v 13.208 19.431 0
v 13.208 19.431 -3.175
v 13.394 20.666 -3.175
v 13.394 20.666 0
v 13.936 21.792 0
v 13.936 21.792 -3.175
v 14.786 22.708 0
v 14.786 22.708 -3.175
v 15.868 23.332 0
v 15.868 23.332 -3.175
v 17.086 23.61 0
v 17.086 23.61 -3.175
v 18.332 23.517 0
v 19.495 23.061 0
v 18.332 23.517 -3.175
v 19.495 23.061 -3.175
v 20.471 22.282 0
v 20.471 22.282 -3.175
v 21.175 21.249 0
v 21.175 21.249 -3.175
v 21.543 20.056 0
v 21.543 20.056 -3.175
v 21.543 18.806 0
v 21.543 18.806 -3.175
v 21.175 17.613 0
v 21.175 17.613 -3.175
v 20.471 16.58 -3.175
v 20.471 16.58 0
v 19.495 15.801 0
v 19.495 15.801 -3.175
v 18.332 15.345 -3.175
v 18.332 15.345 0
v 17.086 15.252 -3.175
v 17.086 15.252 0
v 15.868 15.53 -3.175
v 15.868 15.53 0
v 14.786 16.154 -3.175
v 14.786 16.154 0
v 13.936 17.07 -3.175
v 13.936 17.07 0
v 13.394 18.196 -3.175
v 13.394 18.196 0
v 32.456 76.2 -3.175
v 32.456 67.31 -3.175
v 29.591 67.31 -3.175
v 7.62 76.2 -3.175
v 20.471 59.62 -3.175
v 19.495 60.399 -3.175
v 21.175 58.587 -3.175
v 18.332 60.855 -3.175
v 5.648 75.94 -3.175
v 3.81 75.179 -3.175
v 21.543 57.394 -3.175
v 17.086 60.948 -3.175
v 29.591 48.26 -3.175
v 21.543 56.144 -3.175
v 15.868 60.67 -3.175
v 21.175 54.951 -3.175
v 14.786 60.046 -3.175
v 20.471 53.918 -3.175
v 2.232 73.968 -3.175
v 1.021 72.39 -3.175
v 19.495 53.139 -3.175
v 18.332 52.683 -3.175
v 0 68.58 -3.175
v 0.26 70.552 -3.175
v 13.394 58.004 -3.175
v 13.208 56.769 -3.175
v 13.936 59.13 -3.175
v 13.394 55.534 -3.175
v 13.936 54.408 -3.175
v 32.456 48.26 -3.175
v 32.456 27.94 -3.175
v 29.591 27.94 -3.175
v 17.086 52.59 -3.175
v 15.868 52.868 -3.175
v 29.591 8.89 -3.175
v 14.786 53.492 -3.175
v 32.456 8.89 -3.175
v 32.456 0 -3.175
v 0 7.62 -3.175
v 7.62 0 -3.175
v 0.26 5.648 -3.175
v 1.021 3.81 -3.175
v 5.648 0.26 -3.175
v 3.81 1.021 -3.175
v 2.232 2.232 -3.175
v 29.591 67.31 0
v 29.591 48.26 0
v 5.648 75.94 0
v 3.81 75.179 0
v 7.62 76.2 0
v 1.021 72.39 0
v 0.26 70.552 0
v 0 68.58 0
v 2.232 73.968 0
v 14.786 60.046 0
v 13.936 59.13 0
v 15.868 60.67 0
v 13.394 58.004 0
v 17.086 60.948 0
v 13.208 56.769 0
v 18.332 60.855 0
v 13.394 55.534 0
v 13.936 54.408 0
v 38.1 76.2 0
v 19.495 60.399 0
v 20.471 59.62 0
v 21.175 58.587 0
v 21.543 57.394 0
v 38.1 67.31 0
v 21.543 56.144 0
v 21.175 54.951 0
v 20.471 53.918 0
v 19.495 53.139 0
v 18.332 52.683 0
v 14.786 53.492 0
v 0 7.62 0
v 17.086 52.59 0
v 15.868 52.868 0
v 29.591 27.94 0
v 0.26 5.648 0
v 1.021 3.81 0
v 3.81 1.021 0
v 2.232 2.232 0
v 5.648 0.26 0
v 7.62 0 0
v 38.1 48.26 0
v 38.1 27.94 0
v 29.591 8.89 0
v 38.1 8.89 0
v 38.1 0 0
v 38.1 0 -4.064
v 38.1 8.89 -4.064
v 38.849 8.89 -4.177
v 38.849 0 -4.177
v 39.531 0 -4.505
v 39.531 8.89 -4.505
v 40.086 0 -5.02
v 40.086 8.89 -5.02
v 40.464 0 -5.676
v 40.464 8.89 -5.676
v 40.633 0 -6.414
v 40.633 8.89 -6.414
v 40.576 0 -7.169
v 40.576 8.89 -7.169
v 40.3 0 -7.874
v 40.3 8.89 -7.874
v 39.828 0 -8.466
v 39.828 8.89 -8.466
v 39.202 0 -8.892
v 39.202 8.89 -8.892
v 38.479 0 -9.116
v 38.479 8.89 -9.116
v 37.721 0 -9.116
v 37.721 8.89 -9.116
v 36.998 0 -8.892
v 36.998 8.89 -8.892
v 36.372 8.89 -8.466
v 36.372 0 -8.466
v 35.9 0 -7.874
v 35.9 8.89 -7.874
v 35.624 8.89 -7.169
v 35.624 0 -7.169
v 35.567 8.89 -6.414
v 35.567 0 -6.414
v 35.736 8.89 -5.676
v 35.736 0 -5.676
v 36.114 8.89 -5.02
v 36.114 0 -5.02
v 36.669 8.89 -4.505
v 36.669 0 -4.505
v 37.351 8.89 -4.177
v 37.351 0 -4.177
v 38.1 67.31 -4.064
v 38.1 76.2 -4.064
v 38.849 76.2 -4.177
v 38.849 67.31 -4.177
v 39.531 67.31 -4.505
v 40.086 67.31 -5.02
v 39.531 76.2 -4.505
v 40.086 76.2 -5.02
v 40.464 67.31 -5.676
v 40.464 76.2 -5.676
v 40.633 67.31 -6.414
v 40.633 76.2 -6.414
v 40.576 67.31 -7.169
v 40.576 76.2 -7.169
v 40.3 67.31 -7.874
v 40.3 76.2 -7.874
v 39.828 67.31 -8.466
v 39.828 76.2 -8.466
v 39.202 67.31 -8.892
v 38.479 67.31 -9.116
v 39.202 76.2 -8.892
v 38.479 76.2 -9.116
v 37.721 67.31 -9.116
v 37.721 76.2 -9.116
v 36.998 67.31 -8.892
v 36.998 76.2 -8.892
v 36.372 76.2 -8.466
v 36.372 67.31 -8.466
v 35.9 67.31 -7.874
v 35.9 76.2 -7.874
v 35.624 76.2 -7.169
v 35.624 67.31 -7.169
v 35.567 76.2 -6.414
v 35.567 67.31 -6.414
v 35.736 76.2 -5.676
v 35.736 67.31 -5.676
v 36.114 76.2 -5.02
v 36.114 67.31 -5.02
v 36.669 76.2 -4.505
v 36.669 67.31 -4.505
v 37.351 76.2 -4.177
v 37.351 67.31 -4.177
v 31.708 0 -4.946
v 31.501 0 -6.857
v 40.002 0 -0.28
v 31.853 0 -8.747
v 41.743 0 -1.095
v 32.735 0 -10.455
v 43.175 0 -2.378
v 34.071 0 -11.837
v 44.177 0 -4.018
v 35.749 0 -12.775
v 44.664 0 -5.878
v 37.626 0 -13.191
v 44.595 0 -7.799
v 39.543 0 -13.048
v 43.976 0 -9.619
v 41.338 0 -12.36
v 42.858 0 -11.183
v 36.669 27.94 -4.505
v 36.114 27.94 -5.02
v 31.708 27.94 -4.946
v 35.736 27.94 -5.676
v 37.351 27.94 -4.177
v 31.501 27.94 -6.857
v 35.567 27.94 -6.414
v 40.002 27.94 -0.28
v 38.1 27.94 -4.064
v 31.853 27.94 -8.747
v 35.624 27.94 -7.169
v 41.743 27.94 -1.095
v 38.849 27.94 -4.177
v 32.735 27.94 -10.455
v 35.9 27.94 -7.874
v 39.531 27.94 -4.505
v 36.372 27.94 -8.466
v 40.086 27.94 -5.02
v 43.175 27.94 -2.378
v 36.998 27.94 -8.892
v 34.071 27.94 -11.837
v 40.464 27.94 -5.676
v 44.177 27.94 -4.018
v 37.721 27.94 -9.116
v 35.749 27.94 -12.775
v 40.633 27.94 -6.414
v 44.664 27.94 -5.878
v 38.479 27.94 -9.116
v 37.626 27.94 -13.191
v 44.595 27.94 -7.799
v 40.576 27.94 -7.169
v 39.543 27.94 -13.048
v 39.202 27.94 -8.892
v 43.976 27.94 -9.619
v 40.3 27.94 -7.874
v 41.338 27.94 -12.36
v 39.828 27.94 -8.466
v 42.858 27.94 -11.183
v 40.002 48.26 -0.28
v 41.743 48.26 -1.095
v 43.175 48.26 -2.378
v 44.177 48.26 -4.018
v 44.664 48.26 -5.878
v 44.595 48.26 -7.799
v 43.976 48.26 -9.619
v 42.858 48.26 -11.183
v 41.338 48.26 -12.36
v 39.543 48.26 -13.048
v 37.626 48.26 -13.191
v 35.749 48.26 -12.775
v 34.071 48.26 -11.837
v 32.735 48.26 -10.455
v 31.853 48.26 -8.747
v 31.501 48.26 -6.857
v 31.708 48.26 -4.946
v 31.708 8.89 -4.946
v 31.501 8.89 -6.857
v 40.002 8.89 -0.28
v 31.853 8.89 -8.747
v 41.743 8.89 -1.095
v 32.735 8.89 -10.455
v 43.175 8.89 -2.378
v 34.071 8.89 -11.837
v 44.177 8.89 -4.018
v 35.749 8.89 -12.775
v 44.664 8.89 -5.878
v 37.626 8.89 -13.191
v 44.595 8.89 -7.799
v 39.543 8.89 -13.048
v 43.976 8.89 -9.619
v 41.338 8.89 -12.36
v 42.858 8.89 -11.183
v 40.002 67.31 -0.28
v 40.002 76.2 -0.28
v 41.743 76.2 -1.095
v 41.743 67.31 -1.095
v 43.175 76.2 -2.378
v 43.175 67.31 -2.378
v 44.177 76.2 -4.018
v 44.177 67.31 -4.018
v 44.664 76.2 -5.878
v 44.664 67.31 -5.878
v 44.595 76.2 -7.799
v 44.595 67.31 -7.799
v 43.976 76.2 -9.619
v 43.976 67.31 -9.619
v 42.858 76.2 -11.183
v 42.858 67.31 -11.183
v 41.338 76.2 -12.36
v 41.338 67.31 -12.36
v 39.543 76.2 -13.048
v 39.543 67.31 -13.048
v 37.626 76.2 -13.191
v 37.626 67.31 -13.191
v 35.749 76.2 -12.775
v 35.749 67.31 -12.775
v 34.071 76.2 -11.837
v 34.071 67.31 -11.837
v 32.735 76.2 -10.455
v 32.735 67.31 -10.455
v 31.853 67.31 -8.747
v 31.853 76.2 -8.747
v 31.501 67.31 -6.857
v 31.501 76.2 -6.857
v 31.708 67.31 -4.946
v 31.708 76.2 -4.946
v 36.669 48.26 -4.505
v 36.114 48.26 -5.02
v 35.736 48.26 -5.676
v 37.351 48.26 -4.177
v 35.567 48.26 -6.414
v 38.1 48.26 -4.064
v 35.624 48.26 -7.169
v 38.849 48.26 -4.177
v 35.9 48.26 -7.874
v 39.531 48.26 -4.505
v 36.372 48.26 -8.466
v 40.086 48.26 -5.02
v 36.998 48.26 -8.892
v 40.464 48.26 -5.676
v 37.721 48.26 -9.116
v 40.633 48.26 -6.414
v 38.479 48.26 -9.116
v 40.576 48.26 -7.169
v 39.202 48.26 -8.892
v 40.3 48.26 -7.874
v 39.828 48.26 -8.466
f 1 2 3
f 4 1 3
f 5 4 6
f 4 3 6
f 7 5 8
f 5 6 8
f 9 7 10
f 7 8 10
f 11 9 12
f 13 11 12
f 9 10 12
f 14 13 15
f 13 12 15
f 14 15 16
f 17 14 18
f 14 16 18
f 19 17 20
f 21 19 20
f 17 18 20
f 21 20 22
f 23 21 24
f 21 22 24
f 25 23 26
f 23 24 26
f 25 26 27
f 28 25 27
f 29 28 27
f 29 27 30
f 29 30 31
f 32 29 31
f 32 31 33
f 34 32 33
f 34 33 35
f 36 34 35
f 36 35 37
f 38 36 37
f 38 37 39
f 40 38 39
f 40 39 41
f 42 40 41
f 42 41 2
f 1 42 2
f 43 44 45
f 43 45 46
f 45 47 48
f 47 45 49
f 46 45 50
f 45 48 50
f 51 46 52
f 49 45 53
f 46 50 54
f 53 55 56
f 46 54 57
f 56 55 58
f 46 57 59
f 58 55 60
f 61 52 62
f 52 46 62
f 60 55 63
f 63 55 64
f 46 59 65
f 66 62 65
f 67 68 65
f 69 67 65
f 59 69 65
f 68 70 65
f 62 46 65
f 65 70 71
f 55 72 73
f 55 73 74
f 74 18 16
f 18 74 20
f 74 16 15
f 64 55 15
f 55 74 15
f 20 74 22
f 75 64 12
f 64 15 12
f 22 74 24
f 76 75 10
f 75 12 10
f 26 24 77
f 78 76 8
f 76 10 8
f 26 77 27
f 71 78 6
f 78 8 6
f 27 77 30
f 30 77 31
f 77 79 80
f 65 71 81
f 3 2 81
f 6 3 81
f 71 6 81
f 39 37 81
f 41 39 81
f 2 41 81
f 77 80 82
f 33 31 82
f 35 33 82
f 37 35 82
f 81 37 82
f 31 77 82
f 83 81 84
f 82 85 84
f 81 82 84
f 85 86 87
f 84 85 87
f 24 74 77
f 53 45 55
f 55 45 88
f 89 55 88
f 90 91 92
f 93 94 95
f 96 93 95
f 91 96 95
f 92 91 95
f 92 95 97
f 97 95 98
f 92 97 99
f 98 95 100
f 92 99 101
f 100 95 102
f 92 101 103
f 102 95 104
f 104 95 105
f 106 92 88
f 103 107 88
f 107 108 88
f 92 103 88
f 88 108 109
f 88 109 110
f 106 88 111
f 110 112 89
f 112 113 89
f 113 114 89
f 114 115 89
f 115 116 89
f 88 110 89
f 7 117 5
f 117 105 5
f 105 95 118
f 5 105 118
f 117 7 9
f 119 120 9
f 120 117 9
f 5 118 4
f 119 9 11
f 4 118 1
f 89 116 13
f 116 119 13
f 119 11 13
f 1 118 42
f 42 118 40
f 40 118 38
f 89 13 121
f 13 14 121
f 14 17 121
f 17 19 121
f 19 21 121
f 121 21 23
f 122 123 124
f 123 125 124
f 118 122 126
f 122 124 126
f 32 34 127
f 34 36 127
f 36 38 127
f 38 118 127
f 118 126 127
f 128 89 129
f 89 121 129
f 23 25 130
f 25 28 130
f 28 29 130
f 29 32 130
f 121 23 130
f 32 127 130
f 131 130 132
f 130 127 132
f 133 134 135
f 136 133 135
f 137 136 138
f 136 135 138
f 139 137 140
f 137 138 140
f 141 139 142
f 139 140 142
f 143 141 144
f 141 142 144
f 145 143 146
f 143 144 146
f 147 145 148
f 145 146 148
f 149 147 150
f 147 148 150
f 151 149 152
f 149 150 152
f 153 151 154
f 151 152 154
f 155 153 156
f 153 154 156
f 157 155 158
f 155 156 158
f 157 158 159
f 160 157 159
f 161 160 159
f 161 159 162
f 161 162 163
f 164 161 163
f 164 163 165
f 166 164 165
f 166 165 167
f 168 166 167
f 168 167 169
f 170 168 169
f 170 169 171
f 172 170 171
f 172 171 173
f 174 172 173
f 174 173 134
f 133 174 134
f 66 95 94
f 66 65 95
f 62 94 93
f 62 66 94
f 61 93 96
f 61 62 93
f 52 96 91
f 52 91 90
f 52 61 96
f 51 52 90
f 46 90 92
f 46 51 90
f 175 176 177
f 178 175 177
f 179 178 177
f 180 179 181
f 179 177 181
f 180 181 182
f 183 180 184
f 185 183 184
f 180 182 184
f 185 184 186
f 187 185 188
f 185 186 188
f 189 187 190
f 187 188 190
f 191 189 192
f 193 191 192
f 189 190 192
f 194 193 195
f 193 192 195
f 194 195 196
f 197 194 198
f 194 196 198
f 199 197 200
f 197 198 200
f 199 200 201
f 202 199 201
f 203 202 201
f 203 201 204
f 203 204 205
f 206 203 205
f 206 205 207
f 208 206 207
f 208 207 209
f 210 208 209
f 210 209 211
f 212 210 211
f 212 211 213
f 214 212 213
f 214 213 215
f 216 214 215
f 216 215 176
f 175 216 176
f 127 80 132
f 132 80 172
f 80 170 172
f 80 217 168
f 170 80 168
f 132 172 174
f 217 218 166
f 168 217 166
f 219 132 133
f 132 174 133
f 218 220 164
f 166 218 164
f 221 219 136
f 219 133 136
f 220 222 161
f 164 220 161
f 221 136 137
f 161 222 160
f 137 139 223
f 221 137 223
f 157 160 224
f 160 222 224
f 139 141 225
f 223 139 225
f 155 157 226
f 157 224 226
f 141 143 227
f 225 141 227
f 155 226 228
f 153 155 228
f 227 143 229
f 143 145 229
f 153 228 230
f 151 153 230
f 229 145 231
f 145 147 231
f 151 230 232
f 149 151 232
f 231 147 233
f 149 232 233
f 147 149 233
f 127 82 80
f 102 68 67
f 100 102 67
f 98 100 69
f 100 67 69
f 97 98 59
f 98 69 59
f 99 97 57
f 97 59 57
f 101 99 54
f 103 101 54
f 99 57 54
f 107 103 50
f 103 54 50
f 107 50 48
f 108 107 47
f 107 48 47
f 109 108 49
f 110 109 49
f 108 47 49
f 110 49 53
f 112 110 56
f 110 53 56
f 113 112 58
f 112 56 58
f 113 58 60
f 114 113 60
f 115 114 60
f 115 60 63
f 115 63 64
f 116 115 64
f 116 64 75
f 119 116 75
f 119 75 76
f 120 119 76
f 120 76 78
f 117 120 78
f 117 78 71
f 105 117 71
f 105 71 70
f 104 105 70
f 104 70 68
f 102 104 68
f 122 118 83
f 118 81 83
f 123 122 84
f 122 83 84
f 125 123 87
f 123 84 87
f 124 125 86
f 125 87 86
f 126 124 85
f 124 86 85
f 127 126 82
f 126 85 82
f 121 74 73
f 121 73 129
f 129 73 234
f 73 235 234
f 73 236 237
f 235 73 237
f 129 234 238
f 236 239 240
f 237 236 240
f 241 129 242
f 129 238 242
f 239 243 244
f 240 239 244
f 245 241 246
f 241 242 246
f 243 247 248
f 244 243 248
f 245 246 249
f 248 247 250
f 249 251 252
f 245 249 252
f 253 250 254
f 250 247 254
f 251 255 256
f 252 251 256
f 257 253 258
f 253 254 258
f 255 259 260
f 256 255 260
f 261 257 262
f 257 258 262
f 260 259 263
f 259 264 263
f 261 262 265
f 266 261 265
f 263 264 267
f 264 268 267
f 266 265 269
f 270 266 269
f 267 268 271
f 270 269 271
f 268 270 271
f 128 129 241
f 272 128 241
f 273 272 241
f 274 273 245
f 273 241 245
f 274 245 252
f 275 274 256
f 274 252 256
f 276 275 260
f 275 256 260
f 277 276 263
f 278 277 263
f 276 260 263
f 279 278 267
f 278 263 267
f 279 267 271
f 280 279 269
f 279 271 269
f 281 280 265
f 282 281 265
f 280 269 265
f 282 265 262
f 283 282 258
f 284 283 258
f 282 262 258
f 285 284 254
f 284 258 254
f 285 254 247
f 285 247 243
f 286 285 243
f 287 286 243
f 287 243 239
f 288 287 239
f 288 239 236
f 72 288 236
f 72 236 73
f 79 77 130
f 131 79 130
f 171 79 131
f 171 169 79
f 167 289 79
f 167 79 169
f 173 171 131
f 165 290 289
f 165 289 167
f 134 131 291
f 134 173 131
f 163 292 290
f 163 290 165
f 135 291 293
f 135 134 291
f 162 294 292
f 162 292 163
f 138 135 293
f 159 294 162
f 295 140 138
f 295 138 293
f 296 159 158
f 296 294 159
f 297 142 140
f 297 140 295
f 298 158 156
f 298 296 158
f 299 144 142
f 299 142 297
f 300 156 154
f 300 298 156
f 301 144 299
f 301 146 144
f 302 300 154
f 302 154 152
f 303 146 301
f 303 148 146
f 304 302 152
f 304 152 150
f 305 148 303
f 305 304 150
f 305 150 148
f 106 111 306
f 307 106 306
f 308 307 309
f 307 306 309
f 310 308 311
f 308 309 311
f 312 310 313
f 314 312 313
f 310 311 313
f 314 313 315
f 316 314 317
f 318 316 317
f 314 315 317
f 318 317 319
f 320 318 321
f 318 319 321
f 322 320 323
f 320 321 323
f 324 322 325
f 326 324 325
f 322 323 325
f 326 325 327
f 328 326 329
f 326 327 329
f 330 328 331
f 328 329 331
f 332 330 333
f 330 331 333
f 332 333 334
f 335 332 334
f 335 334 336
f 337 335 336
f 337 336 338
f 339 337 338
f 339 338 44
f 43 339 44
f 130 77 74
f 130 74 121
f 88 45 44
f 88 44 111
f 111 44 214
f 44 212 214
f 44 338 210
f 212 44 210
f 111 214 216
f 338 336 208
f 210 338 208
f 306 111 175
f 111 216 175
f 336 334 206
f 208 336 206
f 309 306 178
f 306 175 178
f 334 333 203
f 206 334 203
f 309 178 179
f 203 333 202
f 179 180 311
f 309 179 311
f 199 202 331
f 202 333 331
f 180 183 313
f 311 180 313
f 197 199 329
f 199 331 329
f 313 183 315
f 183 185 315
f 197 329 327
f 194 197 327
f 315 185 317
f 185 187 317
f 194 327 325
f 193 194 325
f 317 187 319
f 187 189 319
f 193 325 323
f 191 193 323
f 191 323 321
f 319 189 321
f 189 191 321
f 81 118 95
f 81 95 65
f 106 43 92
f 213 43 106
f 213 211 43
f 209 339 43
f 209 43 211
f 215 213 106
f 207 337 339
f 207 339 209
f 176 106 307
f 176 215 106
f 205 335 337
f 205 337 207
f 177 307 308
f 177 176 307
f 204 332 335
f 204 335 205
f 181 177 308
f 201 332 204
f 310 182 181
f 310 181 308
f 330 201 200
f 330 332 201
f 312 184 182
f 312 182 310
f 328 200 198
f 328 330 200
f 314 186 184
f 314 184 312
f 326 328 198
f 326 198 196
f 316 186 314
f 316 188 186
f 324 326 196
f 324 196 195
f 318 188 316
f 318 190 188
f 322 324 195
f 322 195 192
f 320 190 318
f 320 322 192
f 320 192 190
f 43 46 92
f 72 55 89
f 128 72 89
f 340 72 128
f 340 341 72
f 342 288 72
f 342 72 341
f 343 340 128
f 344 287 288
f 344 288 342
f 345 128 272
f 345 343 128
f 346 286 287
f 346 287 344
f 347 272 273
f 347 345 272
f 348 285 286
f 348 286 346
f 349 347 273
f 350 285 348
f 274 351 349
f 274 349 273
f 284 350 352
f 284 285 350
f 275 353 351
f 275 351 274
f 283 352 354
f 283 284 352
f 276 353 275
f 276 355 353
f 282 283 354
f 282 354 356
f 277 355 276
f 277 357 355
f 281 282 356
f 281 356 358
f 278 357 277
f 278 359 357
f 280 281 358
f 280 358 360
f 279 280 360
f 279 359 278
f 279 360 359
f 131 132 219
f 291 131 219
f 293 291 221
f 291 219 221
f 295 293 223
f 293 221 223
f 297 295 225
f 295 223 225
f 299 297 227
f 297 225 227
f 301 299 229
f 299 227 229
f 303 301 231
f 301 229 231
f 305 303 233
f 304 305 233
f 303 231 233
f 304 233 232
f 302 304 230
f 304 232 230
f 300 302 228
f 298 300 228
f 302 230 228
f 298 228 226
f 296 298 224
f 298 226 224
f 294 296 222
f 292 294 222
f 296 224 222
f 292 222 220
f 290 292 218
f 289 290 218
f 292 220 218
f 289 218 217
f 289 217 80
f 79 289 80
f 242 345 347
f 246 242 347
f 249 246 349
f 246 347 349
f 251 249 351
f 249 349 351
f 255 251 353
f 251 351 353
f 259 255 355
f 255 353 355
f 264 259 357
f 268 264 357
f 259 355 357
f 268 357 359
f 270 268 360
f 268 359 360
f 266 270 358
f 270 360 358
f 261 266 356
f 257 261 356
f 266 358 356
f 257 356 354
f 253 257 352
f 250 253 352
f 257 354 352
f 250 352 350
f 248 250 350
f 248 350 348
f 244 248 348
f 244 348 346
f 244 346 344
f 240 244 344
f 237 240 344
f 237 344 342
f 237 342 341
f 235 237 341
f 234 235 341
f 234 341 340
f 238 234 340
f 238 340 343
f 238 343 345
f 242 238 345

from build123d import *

# Parameters (mm, degrees)
BOSS_EXTRUDE1_DEPTH = 76.2
SKETCH2_R           = 4.191
CUT_EXTRUDE1_DEPTH  = 50.8
CUT_EXTRUDE2_START  = 8.89
CUT_EXTRUDE2_DEPTH  = 19.05
CUT_EXTRUDE3_START  = 48.26
CUT_EXTRUDE3_DEPTH  = 19.05
SKETCH3_R           = 2.54
CUT_EXTRUDE4_DEPTH  = 90.327145258
FILLET1_R           = 7.62
FILLET2_R           = 7.62


with BuildPart() as part:
    # Sketch1 → Boss-Extrude1 (new body)
    with BuildSketch(Plane(origin=(0, 0, 0), x_dir=(1, 0, 0), z_dir=(0, 1, 0))):
        with BuildLine():
            Line((0, 0), (38.1, 0))
            ThreePointArc((38.1, 0), (41.337877391, 12.35977675), (32.455996545, 3.175))
            Line((32.455996545, 3.175), (0, 3.175))
            Line((0, 3.175), (0, 0))
        make_face()
    extrude(amount=BOSS_EXTRUDE1_DEPTH)

    # Sketch2 → Cut-Extrude1 (cut)
    with BuildSketch(Plane(origin=(0, 0, -3.175), x_dir=(-1, 0, 0), z_dir=(0, 0, -1))):
        with Locations((-17.399, 56.769)):
            Circle(SKETCH2_R)
        with Locations((-17.399, 19.431)):
            Circle(SKETCH2_R)
    extrude(amount=-CUT_EXTRUDE1_DEPTH, mode=Mode.SUBTRACT)

    # Sketch1<3> → Cut-Extrude2 (cut)
    with BuildSketch(Plane(origin=(0, 0, 0), x_dir=(1, 0, 0), z_dir=(0, 1, 0)).offset(CUT_EXTRUDE2_START)):
        with BuildLine():
            Line((32.455996545, 3.175), (29.591, 3.175))
            Line((29.591, 3.175), (29.591, 0))
            Line((29.591, 0), (38.1, 0))
            ThreePointArc((38.1, 0), (41.337877391, 12.35977675), (32.455996545, 3.175))
        make_face()
    extrude(amount=CUT_EXTRUDE2_DEPTH, mode=Mode.SUBTRACT)

    # Sketch1<5> → Cut-Extrude3 (cut)
    with BuildSketch(Plane(origin=(0, 0, 0), x_dir=(1, 0, 0), z_dir=(0, 1, 0)).offset(CUT_EXTRUDE3_START)):
        with BuildLine():
            Line((32.455996545, 3.175), (29.591, 3.175))
            Line((29.591, 3.175), (29.591, 0))
            Line((29.591, 0), (38.1, 0))
            ThreePointArc((38.1, 0), (41.337877391, 12.35977675), (32.455996545, 3.175))
        make_face()
    extrude(amount=CUT_EXTRUDE3_DEPTH, mode=Mode.SUBTRACT)

    # Sketch3 → Cut-Extrude4 (cut, through all)
    with BuildSketch(Plane(origin=(0, 76.2, 0), x_dir=(1, 0, 0), z_dir=(0, 1, 0))):
        with Locations((38.1, 6.604)):
            Circle(SKETCH3_R)
    extrude(amount=-CUT_EXTRUDE4_DEPTH, mode=Mode.SUBTRACT)

    # Fillet1
    fillet1_edges = [part.edges().sort_by_distance(p)[0] for p in [
        (0, 0, -1.5875),
    ]]
    fillet(fillet1_edges, radius=FILLET1_R)

    # Fillet2
    fillet2_edges = [part.edges().sort_by_distance(p)[0] for p in [
        (0, 76.2, -1.5875),
    ]]
    fillet(fillet2_edges, radius=FILLET2_R)


solid = part.part
